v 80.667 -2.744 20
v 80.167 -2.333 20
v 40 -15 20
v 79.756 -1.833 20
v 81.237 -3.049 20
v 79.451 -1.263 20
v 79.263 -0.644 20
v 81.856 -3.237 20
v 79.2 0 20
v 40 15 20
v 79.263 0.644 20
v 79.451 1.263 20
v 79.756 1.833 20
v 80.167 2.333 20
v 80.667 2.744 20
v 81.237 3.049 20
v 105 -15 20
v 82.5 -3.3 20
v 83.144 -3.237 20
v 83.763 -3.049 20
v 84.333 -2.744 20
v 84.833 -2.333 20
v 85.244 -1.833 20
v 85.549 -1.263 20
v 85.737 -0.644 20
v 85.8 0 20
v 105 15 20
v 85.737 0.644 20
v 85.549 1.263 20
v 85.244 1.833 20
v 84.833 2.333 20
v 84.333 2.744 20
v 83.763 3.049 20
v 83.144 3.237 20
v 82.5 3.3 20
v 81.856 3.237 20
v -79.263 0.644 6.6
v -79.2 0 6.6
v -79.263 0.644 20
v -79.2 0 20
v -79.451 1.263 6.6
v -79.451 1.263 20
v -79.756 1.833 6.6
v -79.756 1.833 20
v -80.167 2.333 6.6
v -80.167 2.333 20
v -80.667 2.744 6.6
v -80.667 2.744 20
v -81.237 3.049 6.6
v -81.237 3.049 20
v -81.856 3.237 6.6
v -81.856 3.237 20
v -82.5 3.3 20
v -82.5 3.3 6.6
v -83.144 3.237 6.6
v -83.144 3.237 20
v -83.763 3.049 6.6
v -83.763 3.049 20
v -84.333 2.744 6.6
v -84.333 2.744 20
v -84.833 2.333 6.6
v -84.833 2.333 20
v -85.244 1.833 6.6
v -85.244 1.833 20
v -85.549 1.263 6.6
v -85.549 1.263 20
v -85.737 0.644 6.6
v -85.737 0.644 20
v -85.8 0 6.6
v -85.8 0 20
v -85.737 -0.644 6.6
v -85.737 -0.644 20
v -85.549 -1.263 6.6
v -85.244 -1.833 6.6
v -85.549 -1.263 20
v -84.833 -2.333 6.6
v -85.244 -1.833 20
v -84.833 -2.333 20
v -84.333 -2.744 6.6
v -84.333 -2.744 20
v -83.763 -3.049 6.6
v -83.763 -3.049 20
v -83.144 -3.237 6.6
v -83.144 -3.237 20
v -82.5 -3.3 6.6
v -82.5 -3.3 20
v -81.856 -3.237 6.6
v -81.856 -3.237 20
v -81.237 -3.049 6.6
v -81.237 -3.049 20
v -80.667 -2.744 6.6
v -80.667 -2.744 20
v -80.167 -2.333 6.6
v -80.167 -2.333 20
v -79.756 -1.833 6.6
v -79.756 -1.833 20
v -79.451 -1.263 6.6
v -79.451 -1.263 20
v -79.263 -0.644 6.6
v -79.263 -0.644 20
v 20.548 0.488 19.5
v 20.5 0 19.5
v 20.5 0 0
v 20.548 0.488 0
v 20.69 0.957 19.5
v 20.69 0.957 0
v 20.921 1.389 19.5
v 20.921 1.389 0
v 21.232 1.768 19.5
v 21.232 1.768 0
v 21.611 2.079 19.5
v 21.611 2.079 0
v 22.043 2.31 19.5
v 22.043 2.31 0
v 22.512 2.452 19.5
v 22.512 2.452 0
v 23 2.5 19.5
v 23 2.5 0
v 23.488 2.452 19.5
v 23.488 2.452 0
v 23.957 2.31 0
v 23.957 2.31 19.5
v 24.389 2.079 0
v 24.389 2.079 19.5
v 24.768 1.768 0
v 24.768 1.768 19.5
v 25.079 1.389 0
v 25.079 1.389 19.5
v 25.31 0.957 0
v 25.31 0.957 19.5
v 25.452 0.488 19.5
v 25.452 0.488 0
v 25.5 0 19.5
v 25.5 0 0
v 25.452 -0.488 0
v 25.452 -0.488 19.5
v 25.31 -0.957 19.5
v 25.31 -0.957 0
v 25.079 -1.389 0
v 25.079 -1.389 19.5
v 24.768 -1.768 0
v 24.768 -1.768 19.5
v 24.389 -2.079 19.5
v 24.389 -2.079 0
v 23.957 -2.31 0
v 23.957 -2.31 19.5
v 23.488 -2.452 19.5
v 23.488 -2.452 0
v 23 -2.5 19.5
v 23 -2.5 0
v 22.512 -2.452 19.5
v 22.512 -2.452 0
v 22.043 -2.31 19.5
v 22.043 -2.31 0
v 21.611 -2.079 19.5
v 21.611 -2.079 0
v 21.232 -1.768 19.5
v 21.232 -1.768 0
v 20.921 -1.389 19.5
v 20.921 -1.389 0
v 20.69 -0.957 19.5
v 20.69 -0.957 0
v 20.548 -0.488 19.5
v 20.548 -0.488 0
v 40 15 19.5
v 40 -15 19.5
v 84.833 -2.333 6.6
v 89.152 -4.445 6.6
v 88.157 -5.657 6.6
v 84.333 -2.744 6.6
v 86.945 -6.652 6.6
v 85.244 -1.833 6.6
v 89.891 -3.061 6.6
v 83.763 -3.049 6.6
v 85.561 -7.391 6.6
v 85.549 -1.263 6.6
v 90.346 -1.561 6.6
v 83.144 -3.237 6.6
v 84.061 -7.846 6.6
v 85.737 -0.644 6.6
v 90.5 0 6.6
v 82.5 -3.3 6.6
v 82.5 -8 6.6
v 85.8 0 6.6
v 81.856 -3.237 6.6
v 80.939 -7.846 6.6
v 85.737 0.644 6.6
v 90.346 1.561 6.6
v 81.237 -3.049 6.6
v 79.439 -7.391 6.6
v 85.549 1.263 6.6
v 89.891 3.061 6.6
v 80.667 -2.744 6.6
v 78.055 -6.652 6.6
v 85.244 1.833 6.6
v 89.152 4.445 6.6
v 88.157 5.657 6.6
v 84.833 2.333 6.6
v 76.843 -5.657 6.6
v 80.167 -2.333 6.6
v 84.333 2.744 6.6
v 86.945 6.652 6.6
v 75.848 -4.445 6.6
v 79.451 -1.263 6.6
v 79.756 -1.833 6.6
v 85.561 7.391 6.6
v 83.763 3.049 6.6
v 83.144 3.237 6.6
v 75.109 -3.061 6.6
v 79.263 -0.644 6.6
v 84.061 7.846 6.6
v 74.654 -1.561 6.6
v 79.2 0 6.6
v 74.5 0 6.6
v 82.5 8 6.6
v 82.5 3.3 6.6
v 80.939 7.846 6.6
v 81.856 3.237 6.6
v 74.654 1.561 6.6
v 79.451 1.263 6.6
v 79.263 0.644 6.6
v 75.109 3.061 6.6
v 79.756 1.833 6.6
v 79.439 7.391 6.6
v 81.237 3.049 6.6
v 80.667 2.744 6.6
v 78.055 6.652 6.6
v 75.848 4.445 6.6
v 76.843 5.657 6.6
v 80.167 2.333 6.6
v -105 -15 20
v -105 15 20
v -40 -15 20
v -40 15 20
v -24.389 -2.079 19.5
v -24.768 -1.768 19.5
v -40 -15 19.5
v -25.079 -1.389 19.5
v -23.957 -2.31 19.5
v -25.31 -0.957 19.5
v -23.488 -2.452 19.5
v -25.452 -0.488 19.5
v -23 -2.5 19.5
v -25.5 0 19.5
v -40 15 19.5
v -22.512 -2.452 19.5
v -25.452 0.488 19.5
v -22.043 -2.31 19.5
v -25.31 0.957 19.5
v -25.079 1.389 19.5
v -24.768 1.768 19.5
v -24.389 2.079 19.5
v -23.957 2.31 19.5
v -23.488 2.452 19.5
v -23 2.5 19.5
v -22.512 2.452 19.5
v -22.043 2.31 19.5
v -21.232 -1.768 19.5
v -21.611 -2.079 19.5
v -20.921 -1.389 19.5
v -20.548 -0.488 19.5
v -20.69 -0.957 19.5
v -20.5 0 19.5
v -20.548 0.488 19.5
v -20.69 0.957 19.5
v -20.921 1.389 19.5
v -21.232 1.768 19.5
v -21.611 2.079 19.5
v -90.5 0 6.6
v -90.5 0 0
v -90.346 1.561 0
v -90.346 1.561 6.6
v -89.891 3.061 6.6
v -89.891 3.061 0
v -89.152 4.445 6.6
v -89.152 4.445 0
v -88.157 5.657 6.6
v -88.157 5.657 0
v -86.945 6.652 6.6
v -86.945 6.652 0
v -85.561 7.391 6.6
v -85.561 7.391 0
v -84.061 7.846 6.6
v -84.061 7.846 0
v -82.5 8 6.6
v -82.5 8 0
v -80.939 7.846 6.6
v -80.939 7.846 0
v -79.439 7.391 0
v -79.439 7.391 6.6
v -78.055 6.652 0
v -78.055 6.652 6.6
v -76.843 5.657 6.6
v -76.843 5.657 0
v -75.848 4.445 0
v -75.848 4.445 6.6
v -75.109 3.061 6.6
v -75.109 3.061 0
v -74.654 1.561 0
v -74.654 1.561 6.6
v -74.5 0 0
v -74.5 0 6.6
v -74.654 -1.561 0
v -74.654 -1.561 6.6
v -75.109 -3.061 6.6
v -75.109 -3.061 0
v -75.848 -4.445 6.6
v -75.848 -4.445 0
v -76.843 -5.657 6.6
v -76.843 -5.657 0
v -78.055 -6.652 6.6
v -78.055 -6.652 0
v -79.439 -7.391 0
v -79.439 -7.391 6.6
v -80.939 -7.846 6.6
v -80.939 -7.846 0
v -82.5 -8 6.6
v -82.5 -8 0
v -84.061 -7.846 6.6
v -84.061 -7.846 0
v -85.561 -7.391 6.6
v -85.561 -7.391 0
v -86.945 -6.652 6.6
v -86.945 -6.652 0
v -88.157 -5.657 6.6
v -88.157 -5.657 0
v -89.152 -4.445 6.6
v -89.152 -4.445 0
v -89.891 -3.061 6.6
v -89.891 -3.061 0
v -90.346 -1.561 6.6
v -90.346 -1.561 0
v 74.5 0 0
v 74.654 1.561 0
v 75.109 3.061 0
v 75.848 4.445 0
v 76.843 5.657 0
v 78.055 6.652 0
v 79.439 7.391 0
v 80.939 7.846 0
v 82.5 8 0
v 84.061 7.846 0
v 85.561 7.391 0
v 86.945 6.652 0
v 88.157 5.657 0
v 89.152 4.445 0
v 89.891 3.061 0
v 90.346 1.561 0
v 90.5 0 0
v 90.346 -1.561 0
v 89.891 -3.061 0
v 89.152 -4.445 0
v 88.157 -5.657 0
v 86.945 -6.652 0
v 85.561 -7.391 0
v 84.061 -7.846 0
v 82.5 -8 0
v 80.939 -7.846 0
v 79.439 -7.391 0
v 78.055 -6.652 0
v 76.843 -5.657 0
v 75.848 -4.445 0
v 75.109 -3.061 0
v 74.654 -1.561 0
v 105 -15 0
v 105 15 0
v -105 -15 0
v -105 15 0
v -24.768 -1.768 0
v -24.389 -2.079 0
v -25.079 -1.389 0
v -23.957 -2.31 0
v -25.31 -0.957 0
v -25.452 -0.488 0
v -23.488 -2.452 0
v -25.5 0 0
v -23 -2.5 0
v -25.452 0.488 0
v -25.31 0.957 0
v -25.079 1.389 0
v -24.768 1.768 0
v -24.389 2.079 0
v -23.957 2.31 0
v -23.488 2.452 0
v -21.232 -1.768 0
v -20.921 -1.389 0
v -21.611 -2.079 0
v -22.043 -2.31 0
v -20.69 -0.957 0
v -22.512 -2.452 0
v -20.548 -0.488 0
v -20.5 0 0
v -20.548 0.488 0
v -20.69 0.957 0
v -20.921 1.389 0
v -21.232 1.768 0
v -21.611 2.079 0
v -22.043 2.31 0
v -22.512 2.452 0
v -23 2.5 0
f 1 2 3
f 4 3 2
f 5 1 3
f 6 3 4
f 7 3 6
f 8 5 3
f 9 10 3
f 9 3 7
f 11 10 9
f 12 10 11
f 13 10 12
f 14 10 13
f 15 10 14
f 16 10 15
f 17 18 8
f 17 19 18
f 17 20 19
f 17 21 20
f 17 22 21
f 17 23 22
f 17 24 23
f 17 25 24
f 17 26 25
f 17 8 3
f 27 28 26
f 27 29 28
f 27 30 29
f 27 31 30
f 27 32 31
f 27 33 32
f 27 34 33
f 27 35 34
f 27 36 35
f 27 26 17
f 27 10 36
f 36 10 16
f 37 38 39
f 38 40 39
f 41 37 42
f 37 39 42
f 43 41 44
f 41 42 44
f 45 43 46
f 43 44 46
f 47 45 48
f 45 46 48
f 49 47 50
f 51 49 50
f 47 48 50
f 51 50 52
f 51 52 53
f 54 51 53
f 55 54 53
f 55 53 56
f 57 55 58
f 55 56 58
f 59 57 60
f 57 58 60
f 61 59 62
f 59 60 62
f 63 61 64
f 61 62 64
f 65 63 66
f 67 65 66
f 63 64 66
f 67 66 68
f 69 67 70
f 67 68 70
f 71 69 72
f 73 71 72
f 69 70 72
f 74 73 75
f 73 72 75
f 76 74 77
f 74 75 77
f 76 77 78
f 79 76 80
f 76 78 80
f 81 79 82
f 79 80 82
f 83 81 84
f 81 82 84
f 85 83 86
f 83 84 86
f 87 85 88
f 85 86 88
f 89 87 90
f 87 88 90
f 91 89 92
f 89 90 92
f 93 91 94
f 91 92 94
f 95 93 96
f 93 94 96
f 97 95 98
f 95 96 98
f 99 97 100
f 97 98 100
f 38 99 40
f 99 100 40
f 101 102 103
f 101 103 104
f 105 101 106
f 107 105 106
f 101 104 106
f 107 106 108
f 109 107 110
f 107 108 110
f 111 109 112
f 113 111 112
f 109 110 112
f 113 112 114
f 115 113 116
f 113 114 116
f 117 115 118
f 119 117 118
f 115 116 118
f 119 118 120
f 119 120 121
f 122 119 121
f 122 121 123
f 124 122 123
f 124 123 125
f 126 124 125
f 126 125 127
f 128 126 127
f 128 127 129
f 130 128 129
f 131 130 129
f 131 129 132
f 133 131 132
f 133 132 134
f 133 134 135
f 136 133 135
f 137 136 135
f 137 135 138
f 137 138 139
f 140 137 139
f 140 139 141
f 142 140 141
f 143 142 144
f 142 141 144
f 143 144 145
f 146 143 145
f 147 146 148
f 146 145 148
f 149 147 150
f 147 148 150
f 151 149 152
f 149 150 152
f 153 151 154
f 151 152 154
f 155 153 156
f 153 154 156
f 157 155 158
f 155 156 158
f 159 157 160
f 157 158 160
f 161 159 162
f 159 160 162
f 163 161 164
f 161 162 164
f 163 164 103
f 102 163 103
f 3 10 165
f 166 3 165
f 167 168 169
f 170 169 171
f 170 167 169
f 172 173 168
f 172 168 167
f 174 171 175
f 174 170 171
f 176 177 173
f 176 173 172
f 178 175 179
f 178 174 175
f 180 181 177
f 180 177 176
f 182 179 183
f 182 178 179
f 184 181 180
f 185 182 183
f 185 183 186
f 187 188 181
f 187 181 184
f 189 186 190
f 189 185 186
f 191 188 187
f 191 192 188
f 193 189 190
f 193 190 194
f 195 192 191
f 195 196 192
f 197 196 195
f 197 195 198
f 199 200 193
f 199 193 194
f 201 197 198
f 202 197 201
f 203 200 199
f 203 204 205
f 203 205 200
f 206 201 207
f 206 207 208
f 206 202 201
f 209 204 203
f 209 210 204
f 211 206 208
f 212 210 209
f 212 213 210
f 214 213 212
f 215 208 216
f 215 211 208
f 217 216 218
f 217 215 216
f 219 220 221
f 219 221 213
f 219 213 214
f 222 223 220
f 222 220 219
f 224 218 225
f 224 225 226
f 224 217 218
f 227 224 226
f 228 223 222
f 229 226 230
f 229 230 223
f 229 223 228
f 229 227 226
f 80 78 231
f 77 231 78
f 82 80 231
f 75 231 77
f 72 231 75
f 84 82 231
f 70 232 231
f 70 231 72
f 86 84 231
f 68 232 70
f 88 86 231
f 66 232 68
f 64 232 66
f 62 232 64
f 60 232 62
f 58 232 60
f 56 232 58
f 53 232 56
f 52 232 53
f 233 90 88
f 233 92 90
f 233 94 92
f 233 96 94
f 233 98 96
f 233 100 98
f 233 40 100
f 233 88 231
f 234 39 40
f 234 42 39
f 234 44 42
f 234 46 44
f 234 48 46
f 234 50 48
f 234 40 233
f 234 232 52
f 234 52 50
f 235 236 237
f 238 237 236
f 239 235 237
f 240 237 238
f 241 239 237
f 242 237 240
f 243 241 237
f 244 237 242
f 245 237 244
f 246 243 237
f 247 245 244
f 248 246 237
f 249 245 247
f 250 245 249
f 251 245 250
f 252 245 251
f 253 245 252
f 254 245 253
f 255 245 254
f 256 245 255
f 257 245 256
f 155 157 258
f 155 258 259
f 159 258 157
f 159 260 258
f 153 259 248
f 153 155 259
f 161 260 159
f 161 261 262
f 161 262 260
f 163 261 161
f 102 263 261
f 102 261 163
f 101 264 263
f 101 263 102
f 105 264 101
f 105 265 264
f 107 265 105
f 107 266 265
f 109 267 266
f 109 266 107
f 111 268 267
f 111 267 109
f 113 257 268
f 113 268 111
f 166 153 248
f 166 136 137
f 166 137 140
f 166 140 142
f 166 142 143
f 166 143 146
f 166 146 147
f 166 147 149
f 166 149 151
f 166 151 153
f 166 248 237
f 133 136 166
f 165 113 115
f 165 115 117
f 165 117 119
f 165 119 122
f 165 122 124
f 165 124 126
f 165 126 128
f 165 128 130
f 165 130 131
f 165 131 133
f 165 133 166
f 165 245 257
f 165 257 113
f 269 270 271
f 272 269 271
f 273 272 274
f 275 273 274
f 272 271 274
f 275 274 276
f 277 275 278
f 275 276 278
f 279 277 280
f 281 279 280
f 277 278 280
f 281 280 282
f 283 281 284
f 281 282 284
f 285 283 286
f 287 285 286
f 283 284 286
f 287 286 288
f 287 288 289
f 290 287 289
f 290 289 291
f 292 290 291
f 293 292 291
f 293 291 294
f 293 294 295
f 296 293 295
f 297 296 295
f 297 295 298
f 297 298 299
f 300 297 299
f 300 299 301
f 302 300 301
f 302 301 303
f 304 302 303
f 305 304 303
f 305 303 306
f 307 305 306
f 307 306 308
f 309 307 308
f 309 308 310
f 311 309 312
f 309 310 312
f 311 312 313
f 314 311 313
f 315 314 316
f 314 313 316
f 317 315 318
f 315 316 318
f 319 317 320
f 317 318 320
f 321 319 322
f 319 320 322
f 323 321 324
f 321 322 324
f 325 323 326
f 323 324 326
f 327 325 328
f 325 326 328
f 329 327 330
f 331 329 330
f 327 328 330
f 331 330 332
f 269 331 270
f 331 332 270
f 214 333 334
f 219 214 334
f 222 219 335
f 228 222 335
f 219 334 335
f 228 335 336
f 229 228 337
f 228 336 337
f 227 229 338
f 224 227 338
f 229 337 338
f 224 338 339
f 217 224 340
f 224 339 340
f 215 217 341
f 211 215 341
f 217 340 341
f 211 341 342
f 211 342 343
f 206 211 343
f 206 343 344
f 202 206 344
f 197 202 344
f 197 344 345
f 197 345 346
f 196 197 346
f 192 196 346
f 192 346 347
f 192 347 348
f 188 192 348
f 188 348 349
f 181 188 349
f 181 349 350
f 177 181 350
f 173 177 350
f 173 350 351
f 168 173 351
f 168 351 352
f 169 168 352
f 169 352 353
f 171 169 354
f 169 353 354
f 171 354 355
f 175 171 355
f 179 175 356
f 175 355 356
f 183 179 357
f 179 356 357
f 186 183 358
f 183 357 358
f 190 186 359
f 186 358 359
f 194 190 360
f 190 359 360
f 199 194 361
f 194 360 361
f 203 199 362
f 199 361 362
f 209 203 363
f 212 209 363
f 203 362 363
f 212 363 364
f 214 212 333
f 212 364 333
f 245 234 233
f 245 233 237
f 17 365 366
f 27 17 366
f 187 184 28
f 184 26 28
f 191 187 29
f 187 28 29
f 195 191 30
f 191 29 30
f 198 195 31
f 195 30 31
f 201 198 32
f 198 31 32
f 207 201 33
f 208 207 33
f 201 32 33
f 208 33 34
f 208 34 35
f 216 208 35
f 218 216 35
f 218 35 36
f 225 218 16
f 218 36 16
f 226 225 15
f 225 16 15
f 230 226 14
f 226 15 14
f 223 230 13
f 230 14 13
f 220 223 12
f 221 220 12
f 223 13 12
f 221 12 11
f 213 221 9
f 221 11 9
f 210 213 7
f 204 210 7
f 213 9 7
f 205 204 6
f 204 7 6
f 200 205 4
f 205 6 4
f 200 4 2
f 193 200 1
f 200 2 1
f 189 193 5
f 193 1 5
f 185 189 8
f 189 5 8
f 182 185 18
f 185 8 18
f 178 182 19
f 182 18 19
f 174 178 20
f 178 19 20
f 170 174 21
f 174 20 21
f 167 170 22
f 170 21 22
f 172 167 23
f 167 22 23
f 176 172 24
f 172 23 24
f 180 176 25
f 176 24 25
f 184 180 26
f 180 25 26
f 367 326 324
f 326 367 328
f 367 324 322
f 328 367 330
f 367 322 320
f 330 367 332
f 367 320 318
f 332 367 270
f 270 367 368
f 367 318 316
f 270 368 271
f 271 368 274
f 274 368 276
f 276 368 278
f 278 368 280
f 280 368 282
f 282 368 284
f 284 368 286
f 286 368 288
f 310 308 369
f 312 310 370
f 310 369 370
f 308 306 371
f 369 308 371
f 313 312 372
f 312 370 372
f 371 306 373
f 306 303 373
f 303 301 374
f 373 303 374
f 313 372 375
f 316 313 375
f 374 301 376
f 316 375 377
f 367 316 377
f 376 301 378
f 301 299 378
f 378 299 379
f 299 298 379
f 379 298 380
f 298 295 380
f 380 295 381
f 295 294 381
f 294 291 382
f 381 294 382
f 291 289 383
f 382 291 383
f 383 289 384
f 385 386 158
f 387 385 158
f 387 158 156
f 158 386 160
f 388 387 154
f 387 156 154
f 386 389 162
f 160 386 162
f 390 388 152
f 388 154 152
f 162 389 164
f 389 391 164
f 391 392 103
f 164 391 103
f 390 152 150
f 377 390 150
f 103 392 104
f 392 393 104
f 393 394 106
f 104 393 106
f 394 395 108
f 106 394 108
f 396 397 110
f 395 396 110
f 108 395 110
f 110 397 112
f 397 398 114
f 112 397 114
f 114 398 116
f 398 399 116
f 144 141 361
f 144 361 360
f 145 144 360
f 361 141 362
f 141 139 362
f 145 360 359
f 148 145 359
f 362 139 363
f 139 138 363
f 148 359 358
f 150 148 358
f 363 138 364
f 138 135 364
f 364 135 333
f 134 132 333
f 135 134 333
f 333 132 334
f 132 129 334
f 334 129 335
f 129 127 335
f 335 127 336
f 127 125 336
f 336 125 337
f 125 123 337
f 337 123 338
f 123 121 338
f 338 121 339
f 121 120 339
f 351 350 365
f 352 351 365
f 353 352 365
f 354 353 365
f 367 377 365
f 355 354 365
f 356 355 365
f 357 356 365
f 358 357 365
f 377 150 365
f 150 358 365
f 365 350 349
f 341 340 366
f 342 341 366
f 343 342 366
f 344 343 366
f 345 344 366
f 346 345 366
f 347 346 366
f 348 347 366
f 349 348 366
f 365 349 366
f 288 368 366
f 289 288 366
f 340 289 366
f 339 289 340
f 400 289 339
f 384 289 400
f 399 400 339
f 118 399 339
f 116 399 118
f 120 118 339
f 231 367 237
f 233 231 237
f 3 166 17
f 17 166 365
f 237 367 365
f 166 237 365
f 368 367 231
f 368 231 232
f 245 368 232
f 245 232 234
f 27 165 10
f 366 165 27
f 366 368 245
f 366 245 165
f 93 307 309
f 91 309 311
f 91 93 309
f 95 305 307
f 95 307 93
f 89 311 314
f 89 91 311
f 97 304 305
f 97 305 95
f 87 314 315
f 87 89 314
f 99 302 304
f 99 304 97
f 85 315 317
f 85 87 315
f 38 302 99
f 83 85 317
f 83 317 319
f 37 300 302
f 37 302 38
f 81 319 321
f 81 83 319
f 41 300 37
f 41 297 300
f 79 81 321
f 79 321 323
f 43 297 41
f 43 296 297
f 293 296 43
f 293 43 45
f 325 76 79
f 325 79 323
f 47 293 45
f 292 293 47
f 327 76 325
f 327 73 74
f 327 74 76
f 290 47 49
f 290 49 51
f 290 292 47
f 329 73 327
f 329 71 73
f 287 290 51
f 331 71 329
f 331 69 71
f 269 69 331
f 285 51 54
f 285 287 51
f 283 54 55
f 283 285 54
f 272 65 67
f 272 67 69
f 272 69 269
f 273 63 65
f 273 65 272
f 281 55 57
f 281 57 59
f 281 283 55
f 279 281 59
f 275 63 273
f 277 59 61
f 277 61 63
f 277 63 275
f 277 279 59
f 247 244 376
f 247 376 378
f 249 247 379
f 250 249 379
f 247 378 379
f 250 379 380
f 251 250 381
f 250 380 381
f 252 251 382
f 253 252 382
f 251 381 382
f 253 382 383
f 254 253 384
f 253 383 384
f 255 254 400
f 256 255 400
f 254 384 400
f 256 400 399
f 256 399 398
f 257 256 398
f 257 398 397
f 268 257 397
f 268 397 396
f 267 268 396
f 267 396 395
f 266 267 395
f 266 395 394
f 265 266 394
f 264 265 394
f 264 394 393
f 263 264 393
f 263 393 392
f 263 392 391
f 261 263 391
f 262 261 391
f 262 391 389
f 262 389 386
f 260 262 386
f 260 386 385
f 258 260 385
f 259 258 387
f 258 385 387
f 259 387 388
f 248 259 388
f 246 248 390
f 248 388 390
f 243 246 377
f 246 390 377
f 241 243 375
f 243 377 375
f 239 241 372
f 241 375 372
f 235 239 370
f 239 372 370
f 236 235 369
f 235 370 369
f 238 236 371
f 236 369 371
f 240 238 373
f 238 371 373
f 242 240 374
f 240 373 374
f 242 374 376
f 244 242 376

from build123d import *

# Parameters (mm, degrees)
SKETCH1_W                                      = 210
SKETCH1_H                                      = 30
EXTRUDE1_DEPTH                                 = 20
CBORE_FOR_M6_HEX_HEAD_FLANGE_BOLT1_D           = 6.6
CBORE_FOR_M6_HEX_HEAD_FLANGE_BOLT1_CBORE_D     = 16
CBORE_FOR_M6_HEX_HEAD_FLANGE_BOLT1_CBORE_DEPTH = 6.6
CUT_EXTRUDE1_REACH                             = 32
SKETCH4_W                                      = 80
SKETCH4_H                                      = 0.5
M6_TAPPED_HOLE1_D                              = 5


with BuildPart() as part:
    # Sketch1 → Extrude1 (new body)
    with BuildSketch(Plane.XY):
        Rectangle(SKETCH1_W, SKETCH1_H)
    extrude(amount=EXTRUDE1_DEPTH)

    # CBORE for M6 Hex Head Flange Bolt1 (through all)
    with Locations(Plane(origin=(0, 0, 0), x_dir=(-1, 0, 0), z_dir=(0, 0, -1))):
        with Locations((82.5, 0), (-82.5, 0)):
            CounterBoreHole(CBORE_FOR_M6_HEX_HEAD_FLANGE_BOLT1_D / 2, CBORE_FOR_M6_HEX_HEAD_FLANGE_BOLT1_CBORE_D / 2, CBORE_FOR_M6_HEX_HEAD_FLANGE_BOLT1_CBORE_DEPTH)

    # Sketch4 → Cut-Extrude1 (cut, up to next)
    with BuildSketch(Plane(origin=(0, 15, 0), x_dir=(1, 0, 0), z_dir=(0, 1, 0)), mode=Mode.PRIVATE) as cut_extrude1_sk1:
        with Locations((0, -19.75)):
            Rectangle(SKETCH4_W, SKETCH4_H)
    cut_extrude1_tool1 = extrude(cut_extrude1_sk1.sketch, amount=-CUT_EXTRUDE1_REACH, mode=Mode.PRIVATE) & part.part
    add(cut_extrude1_tool1.solids().sort_by_distance((0, 15, 19.75))[0], mode=Mode.SUBTRACT)

    # M6 Tapped Hole1 (through all)
    with Locations(Plane.XY.offset(19.5)):
        with Locations((-23, 0), (23, 0)):
            Hole(M6_TAPPED_HOLE1_D / 2)


solid = part.part
